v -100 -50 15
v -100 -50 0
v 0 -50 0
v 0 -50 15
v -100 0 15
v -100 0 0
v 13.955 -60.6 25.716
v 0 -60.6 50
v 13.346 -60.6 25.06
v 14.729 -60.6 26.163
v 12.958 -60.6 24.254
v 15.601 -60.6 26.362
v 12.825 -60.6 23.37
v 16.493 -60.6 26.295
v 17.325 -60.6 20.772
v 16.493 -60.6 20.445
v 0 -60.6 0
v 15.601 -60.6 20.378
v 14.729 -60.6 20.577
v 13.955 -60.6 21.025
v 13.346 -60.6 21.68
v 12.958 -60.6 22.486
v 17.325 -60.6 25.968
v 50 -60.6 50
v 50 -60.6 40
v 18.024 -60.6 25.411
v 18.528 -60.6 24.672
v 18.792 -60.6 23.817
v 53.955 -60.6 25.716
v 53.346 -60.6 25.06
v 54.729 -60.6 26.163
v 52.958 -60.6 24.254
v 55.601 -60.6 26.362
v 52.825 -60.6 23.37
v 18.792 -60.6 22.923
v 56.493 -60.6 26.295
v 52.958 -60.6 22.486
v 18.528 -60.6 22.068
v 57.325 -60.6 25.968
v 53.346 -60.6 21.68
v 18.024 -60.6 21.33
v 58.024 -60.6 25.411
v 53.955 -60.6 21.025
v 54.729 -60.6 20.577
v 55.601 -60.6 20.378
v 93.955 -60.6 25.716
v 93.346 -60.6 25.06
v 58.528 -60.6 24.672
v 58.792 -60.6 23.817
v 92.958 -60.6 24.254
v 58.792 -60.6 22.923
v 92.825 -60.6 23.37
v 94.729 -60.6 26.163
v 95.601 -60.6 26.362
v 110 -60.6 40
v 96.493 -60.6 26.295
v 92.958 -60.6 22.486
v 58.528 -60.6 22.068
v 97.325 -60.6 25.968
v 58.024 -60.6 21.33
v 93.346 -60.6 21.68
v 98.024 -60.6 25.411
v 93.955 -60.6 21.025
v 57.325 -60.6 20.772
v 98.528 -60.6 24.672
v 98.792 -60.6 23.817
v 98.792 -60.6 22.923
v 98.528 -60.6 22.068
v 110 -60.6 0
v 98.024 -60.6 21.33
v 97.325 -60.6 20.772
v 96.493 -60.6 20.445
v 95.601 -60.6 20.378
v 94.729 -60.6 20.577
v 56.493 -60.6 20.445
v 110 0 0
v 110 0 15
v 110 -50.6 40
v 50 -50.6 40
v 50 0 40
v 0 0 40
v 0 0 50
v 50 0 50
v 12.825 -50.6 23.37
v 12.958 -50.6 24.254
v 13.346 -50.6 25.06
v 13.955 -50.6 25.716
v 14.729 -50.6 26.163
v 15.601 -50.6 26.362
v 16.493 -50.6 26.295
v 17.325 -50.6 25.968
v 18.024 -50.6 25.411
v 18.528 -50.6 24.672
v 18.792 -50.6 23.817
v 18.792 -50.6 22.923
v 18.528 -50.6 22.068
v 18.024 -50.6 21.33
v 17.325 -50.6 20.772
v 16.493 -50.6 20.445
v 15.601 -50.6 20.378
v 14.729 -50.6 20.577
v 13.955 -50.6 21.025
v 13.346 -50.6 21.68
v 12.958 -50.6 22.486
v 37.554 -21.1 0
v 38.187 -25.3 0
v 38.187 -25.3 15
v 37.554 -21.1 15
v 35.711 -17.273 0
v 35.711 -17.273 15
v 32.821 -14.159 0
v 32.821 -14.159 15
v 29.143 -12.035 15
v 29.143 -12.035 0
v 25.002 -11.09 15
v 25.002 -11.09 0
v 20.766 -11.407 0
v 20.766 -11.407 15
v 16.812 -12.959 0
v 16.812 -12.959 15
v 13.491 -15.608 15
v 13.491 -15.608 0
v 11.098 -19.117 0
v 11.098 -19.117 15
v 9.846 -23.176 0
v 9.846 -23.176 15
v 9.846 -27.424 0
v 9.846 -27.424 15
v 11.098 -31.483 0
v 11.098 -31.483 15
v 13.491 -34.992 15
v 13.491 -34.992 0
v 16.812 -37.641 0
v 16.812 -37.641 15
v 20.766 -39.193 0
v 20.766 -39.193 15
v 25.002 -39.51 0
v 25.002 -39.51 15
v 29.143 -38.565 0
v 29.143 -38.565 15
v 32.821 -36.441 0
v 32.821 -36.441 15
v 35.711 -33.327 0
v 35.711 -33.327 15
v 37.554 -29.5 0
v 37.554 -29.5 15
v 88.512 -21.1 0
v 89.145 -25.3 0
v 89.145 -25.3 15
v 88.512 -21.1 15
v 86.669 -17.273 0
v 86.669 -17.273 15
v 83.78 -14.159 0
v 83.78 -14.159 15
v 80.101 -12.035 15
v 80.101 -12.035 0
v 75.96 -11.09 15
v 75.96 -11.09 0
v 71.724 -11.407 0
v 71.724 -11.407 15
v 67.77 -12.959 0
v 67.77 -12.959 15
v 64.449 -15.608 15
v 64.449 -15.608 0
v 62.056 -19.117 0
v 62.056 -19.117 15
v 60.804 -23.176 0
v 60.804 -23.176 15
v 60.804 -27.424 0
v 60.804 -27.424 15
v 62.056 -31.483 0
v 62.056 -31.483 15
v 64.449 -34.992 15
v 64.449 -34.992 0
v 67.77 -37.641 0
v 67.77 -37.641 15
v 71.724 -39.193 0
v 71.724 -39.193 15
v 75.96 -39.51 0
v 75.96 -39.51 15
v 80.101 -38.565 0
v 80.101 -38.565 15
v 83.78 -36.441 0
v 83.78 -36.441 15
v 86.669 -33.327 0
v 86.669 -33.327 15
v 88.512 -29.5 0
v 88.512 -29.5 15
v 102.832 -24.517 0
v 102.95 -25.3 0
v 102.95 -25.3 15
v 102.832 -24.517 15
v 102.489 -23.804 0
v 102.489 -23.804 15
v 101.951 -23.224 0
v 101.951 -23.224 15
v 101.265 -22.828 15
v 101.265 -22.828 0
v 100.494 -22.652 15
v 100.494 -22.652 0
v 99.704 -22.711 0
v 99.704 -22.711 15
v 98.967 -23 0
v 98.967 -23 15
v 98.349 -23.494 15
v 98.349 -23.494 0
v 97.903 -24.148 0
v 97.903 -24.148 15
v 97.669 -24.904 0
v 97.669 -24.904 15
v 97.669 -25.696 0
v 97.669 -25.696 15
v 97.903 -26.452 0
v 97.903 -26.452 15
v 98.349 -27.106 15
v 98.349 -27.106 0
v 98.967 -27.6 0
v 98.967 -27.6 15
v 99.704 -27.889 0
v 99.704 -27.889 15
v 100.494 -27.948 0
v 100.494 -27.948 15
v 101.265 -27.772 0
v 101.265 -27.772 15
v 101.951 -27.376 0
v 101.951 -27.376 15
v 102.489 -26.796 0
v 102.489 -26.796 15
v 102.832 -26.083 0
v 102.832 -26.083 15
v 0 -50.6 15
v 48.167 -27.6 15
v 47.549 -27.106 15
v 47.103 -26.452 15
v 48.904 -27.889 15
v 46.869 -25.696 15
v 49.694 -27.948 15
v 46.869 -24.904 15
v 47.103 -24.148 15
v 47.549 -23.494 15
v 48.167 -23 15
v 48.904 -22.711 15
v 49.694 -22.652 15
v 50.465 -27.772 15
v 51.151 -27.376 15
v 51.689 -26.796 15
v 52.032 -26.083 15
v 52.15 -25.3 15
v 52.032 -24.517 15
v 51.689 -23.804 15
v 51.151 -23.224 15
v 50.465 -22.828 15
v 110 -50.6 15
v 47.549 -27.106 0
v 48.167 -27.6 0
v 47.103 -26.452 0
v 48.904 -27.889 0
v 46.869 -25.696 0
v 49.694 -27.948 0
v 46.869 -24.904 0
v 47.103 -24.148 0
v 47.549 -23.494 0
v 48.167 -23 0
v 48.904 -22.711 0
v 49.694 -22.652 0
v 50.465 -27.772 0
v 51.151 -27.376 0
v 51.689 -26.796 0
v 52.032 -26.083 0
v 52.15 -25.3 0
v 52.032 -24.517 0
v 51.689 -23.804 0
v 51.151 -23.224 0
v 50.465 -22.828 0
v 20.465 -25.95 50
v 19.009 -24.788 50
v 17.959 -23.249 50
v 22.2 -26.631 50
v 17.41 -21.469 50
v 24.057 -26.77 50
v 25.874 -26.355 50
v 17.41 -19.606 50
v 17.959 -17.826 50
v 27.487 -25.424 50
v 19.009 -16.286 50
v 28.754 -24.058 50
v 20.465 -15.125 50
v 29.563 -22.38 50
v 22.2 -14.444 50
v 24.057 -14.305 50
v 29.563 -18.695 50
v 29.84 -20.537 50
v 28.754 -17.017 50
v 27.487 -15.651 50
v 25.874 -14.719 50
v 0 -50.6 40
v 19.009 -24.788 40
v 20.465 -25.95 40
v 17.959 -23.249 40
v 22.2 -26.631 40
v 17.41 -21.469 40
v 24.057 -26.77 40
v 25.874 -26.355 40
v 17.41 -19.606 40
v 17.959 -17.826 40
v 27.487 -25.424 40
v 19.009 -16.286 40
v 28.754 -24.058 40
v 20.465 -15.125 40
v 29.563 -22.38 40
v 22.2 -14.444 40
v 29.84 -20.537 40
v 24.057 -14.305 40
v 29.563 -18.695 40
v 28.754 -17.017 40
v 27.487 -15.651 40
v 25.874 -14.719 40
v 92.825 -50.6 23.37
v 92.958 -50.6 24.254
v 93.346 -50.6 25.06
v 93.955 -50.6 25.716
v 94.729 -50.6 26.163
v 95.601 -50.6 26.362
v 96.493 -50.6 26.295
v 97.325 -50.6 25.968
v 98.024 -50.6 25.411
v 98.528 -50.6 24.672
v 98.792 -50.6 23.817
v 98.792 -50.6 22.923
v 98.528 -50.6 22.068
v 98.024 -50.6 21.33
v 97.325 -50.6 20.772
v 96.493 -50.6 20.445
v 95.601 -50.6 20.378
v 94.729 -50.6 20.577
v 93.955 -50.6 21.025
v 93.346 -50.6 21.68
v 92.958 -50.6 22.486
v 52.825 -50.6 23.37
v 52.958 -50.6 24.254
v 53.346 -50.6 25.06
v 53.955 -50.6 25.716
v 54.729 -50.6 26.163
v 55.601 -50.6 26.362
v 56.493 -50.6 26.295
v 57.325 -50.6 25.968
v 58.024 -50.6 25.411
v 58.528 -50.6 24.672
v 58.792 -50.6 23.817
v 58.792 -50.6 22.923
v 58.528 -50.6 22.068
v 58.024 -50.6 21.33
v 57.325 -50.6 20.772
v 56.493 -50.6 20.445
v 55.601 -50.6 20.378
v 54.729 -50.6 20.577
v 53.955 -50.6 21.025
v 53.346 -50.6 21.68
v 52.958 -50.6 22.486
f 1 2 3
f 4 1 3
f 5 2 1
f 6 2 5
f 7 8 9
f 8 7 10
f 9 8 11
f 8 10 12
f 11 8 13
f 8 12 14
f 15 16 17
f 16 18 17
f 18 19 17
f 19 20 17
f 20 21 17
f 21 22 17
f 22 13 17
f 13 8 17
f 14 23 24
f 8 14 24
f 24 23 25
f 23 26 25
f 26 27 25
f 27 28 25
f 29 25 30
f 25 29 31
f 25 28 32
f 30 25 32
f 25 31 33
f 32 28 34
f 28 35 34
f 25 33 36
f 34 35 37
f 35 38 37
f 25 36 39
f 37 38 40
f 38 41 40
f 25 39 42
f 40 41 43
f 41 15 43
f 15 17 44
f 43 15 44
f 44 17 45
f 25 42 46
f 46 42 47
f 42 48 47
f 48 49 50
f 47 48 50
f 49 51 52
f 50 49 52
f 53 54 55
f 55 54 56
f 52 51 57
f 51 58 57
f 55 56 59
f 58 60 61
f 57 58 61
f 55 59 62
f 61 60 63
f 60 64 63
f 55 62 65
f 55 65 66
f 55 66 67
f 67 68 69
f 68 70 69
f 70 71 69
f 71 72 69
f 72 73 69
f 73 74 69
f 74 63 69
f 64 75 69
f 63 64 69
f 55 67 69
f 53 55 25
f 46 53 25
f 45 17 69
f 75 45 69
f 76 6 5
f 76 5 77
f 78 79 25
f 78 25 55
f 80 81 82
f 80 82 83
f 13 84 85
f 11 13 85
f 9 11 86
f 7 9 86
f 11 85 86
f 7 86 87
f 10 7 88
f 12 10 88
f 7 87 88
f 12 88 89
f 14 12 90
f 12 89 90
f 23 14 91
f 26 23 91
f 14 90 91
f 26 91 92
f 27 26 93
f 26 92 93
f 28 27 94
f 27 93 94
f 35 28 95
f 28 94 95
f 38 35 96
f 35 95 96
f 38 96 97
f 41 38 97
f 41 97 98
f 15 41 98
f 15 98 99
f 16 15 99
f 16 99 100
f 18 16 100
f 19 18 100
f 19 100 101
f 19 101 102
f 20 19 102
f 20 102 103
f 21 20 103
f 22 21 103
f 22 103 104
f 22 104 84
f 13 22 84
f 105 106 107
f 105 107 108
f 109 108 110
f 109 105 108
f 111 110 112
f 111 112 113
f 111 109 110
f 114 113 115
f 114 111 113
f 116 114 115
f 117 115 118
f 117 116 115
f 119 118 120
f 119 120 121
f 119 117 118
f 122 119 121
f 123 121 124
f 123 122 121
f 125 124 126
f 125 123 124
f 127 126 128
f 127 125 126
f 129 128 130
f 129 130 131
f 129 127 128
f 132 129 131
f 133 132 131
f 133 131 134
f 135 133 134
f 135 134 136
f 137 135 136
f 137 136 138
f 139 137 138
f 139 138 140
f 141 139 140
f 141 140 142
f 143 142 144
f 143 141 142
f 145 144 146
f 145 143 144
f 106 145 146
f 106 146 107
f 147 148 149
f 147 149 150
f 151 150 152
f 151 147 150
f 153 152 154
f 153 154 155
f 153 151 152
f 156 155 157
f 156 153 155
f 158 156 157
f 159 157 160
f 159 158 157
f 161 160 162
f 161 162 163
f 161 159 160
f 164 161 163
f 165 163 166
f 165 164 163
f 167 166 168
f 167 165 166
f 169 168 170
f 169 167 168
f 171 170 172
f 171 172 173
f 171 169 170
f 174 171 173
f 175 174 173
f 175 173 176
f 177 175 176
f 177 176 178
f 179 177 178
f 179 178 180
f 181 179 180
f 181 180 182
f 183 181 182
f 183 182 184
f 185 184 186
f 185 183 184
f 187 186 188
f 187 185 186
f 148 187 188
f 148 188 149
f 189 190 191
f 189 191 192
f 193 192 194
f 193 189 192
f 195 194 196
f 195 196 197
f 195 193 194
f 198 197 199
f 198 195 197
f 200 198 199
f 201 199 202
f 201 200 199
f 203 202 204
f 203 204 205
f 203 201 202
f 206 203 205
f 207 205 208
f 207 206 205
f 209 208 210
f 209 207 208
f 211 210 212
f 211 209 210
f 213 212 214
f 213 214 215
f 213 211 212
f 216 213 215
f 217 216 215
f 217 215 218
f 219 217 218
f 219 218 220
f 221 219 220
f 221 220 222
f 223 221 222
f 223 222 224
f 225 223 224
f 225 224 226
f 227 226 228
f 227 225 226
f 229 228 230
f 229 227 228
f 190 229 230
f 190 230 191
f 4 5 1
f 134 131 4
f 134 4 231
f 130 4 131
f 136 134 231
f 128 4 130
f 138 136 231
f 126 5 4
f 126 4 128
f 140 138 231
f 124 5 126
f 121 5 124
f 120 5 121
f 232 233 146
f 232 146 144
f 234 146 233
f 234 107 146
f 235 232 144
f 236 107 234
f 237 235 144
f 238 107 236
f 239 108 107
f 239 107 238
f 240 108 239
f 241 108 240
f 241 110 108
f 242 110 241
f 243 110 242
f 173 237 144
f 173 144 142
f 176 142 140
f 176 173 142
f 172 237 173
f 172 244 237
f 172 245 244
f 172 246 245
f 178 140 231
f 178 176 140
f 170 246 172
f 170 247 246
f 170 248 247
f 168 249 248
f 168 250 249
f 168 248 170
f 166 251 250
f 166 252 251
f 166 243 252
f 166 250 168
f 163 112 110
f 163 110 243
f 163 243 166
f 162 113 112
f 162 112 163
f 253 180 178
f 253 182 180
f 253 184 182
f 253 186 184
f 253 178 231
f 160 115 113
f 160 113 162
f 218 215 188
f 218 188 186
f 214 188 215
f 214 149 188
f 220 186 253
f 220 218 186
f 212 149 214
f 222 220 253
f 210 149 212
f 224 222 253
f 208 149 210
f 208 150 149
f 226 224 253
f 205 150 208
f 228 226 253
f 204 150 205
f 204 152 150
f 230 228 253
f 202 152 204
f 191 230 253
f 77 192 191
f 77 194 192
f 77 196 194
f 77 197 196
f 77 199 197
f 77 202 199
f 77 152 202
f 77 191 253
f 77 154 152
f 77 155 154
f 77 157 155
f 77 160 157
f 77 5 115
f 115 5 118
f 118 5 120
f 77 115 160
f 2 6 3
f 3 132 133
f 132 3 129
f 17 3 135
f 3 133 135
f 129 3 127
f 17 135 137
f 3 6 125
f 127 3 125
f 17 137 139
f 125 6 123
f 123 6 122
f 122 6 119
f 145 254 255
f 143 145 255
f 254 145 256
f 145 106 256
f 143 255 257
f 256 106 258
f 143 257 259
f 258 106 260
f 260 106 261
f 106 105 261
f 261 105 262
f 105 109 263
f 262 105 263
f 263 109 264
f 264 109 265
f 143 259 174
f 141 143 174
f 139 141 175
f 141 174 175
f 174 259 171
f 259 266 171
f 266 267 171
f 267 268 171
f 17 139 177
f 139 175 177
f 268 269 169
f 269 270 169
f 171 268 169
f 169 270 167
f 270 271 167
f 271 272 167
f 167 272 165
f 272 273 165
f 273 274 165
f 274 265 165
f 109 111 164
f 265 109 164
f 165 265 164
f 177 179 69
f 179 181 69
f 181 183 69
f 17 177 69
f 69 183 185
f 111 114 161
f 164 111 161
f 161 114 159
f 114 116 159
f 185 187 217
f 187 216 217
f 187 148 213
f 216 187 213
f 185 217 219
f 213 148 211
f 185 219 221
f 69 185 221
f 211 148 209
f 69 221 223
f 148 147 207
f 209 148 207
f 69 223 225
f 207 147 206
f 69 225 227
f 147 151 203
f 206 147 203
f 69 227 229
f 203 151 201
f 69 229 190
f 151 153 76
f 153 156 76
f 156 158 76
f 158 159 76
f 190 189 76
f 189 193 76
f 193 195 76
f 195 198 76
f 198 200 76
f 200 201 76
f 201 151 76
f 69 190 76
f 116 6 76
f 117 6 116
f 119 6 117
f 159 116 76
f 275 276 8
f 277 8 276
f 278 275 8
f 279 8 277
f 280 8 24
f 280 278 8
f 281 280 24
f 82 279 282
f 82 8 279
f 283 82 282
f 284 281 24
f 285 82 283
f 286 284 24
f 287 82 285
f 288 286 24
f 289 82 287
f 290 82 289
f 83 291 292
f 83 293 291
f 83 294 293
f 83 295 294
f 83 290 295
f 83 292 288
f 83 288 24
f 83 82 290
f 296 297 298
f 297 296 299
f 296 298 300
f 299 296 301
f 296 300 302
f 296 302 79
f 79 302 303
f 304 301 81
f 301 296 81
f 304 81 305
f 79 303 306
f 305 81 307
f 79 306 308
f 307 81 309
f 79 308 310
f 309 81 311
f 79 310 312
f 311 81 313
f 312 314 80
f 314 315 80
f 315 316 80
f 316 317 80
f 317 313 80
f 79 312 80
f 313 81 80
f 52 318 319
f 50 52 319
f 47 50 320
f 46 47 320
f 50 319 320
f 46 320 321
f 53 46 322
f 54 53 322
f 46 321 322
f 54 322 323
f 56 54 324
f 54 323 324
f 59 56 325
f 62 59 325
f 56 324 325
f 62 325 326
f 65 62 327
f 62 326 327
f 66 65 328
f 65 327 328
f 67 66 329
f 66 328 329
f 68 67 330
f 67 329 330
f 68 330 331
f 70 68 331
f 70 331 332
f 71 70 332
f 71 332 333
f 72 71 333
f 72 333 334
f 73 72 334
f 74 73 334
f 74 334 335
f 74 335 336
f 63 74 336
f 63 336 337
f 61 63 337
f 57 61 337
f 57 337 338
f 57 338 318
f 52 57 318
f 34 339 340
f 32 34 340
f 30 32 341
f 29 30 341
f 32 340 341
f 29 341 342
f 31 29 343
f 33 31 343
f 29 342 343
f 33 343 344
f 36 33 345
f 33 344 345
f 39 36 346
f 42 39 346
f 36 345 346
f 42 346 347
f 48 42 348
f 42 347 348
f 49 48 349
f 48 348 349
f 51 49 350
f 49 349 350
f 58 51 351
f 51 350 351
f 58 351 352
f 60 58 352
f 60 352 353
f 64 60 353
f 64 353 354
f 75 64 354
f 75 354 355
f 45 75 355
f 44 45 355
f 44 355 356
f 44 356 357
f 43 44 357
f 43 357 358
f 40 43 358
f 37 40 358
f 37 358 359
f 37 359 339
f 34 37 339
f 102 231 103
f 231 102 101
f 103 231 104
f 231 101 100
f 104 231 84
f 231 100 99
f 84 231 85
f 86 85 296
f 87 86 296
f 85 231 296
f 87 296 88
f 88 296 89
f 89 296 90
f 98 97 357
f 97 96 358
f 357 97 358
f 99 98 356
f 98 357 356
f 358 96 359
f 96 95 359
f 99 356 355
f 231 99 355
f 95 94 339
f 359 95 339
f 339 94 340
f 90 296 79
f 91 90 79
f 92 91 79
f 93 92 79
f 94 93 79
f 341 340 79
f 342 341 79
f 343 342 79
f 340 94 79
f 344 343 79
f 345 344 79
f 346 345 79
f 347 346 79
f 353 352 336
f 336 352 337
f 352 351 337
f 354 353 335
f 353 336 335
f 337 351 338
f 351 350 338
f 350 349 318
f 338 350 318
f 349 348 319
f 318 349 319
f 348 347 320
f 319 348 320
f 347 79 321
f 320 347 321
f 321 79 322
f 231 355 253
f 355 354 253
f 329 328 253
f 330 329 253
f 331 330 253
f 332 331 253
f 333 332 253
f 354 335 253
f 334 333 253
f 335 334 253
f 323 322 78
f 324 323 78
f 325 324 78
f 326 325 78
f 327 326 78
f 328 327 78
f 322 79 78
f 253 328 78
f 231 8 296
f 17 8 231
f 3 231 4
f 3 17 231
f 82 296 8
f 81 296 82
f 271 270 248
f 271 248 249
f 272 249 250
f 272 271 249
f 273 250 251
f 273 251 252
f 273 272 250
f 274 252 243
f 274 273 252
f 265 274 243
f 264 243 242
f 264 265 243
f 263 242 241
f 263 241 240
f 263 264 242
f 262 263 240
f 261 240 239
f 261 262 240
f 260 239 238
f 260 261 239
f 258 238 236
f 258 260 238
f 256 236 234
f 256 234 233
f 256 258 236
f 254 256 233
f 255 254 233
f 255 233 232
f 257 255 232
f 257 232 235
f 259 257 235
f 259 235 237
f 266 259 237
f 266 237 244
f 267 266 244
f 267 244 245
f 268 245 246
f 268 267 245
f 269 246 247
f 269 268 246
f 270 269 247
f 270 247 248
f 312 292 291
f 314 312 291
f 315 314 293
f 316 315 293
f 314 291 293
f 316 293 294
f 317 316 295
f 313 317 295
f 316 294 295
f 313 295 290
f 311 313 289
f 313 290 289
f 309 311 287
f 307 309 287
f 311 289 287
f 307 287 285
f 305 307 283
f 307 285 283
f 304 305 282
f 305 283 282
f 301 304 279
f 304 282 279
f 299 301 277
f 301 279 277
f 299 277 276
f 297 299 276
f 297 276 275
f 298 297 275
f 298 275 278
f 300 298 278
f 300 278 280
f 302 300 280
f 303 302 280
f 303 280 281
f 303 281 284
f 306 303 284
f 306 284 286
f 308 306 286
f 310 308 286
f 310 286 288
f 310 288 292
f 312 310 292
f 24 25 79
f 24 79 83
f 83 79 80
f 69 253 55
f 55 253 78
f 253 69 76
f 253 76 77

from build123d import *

# Parameters (mm, degrees)
F0_W      = 110
F0_H      = 50.6
F0_R      = 14.25
F0_R_2    = 2.655333
F1_DEPTH  = 15
F2_W      = 110
F2_H      = 40
F3_DEPTH  = 10
F4_R      = 3
F5_DEPTH  = 25
F6_W      = 50
F6_H      = 60.6
F7_DEPTH  = 10
F8_R      = 6.25
F9_DEPTH  = 25
F11_W     = 100
F11_H     = 50
F12_DEPTH = 15


with BuildPart() as f1:
    # F0 (on Top) → F1 (new body)
    with BuildSketch(Plane.XY):
        with Locations((55, -25.3)):
            Rectangle(F0_W, F0_H)
        with Locations((23.936599, -25.3)):
            Circle(F0_R, mode=Mode.SUBTRACT)
        with Locations((49.495114, -25.3)):
            Circle(F0_R_2, mode=Mode.SUBTRACT)
        with Locations((74.895114, -25.3)):
            Circle(F0_R, mode=Mode.SUBTRACT)
        with Locations((100.295114, -25.3)):
            Circle(F0_R_2, mode=Mode.SUBTRACT)
    extrude(amount=F1_DEPTH)

    # F2 (on face) → F3 (join)
    with BuildSketch(Plane.XZ.offset(50.6)):
        with Locations((55, 20)):
            Rectangle(F2_W, F2_H)
    extrude(amount=F3_DEPTH)

    # F4 (on face) → F5 (cut)
    with BuildSketch(Plane(origin=(0, -50.6, 0), x_dir=(-1, 0, 0), z_dir=(0, 1, 0))):
        with Locations((-95.825091, 23.370054)):
            Circle(F4_R)
        with Locations((-55.825091, 23.370054)):
            Circle(F4_R)
        with Locations((-15.825091, 23.370054)):
            Circle(F4_R)
    extrude(amount=-F5_DEPTH, mode=Mode.SUBTRACT)

    # F6 (on face) → F7 (join)
    with BuildSketch(Plane.XY.offset(40)):
        with Locations((25, -30.3)):
            Rectangle(F6_W, F6_H)
    extrude(amount=F7_DEPTH)

    # F8 (on face) → F9 (cut)
    with BuildSketch(Plane.XY.offset(50)):
        with Locations((23.590377, -20.537321)):
            Circle(F8_R)
    extrude(amount=-F9_DEPTH, mode=Mode.SUBTRACT)

    # F11 (on Top) → F12 (join)
    with BuildSketch(Plane.XY):
        with Locations((-50, -25)):
            Rectangle(F11_W, F11_H)
    extrude(amount=F12_DEPTH)


solid = f1.part
